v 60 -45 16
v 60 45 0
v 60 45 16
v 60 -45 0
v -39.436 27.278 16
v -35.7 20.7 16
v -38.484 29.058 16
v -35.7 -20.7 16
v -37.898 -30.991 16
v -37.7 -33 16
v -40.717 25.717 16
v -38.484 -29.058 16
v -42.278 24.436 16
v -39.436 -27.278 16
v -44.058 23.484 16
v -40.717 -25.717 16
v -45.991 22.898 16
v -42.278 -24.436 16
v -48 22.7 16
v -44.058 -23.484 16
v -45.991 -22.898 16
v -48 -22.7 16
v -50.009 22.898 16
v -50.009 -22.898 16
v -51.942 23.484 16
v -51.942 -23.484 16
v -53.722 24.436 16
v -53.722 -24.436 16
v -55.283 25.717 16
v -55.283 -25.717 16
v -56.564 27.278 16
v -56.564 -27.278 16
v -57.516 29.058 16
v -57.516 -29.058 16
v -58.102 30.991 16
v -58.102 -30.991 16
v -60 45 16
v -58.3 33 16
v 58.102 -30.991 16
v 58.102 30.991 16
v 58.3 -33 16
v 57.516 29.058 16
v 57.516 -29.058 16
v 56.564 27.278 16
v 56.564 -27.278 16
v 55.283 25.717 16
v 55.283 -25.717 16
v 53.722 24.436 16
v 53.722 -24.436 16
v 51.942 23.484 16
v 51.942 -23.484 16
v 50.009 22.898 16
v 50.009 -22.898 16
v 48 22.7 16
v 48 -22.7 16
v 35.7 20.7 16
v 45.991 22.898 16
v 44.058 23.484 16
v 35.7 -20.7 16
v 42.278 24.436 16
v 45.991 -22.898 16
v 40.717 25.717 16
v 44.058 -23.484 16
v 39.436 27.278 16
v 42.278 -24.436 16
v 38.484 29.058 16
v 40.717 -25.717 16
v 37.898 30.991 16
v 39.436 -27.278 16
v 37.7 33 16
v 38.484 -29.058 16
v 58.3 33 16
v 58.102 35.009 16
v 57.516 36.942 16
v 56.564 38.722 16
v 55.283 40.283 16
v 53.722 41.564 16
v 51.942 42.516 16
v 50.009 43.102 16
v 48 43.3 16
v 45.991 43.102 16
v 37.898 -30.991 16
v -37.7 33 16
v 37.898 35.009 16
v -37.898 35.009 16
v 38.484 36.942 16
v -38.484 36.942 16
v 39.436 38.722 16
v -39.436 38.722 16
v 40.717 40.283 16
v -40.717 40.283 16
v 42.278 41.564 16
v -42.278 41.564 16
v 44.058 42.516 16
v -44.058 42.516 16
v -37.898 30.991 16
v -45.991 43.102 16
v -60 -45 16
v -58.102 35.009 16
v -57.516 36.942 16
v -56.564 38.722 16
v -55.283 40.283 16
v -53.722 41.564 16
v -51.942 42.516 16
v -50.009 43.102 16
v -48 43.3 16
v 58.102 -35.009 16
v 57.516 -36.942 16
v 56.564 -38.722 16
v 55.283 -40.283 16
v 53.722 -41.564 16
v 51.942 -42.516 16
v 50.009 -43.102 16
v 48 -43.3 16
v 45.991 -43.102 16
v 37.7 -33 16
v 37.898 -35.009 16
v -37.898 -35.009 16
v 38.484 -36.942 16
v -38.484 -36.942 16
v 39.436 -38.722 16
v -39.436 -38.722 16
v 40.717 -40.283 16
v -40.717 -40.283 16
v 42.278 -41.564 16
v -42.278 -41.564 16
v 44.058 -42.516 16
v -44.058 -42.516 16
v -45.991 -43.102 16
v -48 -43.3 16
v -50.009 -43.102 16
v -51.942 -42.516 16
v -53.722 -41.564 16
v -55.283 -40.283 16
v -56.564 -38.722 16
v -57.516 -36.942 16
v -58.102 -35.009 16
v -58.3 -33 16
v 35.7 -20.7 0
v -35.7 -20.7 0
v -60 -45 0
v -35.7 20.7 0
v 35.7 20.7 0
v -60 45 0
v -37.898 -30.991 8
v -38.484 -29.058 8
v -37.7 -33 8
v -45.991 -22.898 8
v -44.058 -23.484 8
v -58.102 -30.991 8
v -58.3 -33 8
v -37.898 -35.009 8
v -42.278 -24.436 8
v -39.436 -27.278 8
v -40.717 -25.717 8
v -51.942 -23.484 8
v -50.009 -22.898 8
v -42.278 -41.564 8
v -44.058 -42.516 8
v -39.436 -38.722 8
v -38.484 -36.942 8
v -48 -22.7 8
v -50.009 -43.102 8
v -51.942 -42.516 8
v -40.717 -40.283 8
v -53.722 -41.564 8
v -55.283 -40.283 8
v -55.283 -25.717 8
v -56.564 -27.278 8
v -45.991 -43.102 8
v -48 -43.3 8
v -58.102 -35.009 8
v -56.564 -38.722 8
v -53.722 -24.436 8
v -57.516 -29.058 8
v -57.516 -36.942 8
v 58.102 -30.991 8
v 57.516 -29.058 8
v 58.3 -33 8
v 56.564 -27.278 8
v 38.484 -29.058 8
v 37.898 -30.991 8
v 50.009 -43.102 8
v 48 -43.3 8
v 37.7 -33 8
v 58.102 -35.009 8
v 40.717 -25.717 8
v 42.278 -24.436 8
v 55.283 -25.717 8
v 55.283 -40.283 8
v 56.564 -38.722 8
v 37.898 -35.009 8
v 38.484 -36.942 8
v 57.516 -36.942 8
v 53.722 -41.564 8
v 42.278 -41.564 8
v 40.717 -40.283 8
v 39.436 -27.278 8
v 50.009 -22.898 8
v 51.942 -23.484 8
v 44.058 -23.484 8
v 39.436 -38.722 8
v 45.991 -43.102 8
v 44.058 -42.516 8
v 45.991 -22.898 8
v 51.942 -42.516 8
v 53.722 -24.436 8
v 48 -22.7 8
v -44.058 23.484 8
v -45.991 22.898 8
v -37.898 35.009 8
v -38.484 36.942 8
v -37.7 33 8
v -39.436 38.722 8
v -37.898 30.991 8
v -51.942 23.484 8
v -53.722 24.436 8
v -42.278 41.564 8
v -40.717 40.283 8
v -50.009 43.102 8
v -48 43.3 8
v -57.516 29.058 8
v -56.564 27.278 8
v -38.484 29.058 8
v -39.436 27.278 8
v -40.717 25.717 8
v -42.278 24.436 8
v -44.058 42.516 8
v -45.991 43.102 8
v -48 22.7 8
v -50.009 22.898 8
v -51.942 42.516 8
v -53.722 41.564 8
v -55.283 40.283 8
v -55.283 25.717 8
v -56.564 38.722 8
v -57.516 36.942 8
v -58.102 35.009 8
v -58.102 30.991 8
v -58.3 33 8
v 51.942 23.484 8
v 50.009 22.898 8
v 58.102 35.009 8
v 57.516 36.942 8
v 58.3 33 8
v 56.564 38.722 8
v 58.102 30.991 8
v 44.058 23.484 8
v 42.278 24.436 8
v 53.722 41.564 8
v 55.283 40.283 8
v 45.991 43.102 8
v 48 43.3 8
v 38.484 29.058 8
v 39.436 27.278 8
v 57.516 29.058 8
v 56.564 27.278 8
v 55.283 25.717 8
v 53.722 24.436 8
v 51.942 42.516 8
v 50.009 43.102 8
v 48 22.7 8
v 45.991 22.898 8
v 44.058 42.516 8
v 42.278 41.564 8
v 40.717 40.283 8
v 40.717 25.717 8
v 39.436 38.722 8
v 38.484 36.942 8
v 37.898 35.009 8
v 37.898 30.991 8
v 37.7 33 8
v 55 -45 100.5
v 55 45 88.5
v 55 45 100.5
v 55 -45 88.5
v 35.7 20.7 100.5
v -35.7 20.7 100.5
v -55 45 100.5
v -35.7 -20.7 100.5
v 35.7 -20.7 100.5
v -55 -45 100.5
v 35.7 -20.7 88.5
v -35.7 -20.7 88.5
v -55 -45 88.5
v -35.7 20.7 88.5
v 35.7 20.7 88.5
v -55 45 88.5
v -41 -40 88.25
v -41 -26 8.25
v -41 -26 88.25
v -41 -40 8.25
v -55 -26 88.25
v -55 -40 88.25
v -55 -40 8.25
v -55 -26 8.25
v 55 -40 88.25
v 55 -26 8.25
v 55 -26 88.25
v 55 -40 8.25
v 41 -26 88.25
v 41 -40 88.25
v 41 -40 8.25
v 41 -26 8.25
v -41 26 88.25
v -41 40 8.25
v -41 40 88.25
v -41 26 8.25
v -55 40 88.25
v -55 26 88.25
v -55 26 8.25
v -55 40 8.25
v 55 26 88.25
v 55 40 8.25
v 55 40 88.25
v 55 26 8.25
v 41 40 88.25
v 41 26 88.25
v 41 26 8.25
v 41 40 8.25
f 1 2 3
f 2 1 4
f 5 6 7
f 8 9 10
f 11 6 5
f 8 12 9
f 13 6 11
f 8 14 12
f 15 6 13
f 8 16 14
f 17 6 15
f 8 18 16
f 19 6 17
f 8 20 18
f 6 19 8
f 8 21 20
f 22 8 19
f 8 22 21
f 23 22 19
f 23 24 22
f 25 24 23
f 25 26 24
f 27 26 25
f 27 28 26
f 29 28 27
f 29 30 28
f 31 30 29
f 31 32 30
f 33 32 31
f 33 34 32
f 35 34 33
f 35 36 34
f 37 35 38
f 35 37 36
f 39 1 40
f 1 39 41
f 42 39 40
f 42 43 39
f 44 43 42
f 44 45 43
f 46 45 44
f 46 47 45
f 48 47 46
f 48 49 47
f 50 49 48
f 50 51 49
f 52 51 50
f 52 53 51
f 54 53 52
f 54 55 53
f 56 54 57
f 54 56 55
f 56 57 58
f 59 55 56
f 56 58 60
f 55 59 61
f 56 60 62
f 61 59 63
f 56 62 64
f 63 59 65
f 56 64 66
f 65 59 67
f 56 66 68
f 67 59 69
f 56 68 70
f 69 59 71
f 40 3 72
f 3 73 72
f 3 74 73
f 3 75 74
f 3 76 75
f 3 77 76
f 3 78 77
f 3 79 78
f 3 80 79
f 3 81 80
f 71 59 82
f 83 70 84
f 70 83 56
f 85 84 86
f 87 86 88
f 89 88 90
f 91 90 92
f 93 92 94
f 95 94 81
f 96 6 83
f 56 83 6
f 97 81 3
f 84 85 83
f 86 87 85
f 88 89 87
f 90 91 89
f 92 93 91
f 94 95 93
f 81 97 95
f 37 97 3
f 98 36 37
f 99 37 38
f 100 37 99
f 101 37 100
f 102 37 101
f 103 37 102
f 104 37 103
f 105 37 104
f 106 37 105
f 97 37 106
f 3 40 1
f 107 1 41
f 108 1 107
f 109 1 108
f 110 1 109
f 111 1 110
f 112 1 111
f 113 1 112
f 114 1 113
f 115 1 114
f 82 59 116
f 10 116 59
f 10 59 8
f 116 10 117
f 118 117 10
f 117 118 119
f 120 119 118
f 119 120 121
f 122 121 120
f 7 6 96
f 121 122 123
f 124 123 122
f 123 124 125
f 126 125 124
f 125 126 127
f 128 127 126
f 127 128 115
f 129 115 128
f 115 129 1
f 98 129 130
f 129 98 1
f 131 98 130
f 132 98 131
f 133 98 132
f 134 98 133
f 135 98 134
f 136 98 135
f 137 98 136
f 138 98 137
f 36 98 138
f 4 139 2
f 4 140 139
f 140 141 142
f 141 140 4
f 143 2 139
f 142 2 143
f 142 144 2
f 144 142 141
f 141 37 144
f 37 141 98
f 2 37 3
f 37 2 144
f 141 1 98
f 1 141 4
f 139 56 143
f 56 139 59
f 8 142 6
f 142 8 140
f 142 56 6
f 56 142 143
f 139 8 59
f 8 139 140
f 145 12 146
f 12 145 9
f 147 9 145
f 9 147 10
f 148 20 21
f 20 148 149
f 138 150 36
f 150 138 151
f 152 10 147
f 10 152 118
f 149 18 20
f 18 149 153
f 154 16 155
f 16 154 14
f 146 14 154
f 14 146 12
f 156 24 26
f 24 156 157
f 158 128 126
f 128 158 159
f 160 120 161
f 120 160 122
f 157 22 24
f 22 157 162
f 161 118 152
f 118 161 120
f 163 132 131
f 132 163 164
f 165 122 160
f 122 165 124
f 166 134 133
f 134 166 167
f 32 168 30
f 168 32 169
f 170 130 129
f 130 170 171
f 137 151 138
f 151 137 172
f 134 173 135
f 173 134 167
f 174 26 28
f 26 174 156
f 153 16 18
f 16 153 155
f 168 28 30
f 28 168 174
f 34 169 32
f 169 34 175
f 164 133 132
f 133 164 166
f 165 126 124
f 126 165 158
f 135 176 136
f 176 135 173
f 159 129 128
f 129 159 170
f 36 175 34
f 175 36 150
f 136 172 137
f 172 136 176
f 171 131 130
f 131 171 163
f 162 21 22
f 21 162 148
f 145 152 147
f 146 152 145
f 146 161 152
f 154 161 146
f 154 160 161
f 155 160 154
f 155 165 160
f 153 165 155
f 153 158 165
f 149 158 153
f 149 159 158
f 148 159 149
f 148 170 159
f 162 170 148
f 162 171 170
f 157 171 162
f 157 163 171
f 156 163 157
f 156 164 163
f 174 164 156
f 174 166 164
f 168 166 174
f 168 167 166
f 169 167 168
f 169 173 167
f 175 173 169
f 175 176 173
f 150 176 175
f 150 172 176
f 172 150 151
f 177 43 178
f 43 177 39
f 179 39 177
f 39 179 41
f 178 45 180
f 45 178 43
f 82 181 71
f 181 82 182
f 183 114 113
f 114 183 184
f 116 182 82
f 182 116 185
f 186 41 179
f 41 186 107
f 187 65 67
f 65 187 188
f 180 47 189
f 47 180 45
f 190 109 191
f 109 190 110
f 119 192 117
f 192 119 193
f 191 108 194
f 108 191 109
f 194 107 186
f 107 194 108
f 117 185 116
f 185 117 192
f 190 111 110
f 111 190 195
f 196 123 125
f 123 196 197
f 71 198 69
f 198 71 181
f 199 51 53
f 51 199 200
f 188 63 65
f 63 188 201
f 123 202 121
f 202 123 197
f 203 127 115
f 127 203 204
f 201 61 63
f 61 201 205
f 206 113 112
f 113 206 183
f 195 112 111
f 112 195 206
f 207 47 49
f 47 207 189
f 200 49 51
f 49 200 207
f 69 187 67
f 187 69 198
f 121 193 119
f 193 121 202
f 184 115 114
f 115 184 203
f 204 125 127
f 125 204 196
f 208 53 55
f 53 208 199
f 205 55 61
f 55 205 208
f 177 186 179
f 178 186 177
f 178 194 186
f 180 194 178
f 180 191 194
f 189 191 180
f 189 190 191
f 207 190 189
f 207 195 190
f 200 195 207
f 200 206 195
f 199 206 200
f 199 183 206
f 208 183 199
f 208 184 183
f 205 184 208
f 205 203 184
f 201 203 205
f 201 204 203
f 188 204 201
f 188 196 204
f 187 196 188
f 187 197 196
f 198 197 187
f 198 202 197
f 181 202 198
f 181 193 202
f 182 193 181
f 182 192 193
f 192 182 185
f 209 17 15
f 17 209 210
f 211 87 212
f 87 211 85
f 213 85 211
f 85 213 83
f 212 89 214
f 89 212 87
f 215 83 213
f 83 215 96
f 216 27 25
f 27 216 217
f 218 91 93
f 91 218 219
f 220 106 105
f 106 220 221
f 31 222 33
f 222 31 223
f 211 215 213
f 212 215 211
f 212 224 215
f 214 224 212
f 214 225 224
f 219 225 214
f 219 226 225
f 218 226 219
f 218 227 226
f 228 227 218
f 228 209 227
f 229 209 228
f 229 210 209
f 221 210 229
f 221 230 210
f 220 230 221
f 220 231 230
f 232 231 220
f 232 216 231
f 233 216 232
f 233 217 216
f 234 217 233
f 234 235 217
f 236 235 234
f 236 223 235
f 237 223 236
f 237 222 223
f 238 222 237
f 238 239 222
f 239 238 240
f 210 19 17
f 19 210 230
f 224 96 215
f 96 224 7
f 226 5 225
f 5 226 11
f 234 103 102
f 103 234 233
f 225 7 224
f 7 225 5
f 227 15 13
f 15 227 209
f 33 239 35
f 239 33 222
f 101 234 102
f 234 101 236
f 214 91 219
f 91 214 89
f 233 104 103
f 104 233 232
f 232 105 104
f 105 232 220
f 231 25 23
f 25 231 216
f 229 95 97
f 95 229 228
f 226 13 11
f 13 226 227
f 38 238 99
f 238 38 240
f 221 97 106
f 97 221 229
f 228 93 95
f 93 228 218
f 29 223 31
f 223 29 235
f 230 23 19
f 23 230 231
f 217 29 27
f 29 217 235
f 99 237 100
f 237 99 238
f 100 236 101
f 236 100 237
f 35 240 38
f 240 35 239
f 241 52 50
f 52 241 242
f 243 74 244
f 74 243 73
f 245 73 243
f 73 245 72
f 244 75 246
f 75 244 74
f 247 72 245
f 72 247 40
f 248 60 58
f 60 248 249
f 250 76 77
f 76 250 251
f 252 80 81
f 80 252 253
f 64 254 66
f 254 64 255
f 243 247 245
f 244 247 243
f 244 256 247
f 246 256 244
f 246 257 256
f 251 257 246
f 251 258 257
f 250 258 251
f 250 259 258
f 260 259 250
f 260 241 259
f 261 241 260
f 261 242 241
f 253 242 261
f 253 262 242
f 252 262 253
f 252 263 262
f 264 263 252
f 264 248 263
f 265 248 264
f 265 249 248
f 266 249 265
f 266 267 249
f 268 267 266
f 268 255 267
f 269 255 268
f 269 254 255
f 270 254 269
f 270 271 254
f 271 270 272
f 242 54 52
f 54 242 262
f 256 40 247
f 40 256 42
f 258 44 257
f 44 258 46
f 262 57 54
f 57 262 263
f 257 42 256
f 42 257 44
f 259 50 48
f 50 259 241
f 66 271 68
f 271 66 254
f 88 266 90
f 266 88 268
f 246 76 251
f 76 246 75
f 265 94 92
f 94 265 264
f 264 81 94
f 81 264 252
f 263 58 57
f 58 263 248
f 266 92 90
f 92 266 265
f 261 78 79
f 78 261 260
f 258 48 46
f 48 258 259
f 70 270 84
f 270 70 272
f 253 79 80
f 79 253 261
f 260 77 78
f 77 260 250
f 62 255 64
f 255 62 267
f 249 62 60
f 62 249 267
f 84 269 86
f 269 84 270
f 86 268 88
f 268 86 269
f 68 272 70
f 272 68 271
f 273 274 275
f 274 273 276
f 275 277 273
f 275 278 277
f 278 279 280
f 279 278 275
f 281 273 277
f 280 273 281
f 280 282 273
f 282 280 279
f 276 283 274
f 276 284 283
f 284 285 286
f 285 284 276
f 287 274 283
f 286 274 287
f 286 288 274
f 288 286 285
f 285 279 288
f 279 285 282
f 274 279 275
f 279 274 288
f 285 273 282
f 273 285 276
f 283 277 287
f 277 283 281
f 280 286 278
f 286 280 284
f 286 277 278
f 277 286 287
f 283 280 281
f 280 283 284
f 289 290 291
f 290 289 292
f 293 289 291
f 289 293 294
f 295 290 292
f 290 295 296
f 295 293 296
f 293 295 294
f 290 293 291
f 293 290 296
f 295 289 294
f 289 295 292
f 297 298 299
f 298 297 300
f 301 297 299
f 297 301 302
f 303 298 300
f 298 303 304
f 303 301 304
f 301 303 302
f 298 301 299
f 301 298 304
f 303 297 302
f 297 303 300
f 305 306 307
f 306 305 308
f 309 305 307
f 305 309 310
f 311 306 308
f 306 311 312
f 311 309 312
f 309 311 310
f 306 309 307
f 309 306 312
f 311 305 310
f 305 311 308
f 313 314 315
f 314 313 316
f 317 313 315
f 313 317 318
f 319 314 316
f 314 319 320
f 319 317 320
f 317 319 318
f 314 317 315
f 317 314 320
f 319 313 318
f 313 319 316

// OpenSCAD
$fn = 32;

// ------------------------------------------------------------------------
// Frame cube: base 120 x 90 mm, posts 80 mm tall
// Every part is its own module, assembly() places every instance.
// ------------------------------------------------------------------------

// --- part 1 ---
module base_frame() {
  difference() {
    translate([-60, -45, 0]) cube([120, 90, 16]);
    translate([-35.7, -20.7, -1]) cube([71.4, 41.4, 18]);
    translate([-48, -33, 8]) cylinder(h = 9, d = 20.6);
    translate([48, -33, 8]) cylinder(h = 9, d = 20.6);
    translate([-48, 33, 8]) cylinder(h = 9, d = 20.6);
    translate([48, 33, 8]) cylinder(h = 9, d = 20.6);
  }
}

// --- part 2 ---
module corner_post() {
  translate([-7, -7, 0]) cube([14, 14, 80]);
}

// --- part 3 ---
module top_frame() {
  difference() {
    translate([-55, -45, 0]) cube([110, 90, 12]);
    translate([-35.7, -20.7, -1]) cube([71.4, 41.4, 14]);
  }
}

// --- assembly ---
module assembly() {
  color([0.80, 0.24, 0.20]) translate([0, 0, 0]) rotate([0, 0, 0]) base_frame();
  color([0.20, 0.45, 0.75]) translate([-48, -33, 8.25]) rotate([0, 0, 0]) corner_post();
  color([0.25, 0.62, 0.32]) translate([48, -33, 8.25]) rotate([0, 0, 0]) corner_post();
  color([0.92, 0.70, 0.18]) translate([-48, 33, 8.25]) rotate([0, 0, 0]) corner_post();
  color([0.58, 0.35, 0.70]) translate([48, 33, 8.25]) rotate([0, 0, 0]) corner_post();
  color([0.16, 0.66, 0.66]) translate([0, 0, 88.5]) rotate([0, 0, 0]) top_frame();
}

assembly();
